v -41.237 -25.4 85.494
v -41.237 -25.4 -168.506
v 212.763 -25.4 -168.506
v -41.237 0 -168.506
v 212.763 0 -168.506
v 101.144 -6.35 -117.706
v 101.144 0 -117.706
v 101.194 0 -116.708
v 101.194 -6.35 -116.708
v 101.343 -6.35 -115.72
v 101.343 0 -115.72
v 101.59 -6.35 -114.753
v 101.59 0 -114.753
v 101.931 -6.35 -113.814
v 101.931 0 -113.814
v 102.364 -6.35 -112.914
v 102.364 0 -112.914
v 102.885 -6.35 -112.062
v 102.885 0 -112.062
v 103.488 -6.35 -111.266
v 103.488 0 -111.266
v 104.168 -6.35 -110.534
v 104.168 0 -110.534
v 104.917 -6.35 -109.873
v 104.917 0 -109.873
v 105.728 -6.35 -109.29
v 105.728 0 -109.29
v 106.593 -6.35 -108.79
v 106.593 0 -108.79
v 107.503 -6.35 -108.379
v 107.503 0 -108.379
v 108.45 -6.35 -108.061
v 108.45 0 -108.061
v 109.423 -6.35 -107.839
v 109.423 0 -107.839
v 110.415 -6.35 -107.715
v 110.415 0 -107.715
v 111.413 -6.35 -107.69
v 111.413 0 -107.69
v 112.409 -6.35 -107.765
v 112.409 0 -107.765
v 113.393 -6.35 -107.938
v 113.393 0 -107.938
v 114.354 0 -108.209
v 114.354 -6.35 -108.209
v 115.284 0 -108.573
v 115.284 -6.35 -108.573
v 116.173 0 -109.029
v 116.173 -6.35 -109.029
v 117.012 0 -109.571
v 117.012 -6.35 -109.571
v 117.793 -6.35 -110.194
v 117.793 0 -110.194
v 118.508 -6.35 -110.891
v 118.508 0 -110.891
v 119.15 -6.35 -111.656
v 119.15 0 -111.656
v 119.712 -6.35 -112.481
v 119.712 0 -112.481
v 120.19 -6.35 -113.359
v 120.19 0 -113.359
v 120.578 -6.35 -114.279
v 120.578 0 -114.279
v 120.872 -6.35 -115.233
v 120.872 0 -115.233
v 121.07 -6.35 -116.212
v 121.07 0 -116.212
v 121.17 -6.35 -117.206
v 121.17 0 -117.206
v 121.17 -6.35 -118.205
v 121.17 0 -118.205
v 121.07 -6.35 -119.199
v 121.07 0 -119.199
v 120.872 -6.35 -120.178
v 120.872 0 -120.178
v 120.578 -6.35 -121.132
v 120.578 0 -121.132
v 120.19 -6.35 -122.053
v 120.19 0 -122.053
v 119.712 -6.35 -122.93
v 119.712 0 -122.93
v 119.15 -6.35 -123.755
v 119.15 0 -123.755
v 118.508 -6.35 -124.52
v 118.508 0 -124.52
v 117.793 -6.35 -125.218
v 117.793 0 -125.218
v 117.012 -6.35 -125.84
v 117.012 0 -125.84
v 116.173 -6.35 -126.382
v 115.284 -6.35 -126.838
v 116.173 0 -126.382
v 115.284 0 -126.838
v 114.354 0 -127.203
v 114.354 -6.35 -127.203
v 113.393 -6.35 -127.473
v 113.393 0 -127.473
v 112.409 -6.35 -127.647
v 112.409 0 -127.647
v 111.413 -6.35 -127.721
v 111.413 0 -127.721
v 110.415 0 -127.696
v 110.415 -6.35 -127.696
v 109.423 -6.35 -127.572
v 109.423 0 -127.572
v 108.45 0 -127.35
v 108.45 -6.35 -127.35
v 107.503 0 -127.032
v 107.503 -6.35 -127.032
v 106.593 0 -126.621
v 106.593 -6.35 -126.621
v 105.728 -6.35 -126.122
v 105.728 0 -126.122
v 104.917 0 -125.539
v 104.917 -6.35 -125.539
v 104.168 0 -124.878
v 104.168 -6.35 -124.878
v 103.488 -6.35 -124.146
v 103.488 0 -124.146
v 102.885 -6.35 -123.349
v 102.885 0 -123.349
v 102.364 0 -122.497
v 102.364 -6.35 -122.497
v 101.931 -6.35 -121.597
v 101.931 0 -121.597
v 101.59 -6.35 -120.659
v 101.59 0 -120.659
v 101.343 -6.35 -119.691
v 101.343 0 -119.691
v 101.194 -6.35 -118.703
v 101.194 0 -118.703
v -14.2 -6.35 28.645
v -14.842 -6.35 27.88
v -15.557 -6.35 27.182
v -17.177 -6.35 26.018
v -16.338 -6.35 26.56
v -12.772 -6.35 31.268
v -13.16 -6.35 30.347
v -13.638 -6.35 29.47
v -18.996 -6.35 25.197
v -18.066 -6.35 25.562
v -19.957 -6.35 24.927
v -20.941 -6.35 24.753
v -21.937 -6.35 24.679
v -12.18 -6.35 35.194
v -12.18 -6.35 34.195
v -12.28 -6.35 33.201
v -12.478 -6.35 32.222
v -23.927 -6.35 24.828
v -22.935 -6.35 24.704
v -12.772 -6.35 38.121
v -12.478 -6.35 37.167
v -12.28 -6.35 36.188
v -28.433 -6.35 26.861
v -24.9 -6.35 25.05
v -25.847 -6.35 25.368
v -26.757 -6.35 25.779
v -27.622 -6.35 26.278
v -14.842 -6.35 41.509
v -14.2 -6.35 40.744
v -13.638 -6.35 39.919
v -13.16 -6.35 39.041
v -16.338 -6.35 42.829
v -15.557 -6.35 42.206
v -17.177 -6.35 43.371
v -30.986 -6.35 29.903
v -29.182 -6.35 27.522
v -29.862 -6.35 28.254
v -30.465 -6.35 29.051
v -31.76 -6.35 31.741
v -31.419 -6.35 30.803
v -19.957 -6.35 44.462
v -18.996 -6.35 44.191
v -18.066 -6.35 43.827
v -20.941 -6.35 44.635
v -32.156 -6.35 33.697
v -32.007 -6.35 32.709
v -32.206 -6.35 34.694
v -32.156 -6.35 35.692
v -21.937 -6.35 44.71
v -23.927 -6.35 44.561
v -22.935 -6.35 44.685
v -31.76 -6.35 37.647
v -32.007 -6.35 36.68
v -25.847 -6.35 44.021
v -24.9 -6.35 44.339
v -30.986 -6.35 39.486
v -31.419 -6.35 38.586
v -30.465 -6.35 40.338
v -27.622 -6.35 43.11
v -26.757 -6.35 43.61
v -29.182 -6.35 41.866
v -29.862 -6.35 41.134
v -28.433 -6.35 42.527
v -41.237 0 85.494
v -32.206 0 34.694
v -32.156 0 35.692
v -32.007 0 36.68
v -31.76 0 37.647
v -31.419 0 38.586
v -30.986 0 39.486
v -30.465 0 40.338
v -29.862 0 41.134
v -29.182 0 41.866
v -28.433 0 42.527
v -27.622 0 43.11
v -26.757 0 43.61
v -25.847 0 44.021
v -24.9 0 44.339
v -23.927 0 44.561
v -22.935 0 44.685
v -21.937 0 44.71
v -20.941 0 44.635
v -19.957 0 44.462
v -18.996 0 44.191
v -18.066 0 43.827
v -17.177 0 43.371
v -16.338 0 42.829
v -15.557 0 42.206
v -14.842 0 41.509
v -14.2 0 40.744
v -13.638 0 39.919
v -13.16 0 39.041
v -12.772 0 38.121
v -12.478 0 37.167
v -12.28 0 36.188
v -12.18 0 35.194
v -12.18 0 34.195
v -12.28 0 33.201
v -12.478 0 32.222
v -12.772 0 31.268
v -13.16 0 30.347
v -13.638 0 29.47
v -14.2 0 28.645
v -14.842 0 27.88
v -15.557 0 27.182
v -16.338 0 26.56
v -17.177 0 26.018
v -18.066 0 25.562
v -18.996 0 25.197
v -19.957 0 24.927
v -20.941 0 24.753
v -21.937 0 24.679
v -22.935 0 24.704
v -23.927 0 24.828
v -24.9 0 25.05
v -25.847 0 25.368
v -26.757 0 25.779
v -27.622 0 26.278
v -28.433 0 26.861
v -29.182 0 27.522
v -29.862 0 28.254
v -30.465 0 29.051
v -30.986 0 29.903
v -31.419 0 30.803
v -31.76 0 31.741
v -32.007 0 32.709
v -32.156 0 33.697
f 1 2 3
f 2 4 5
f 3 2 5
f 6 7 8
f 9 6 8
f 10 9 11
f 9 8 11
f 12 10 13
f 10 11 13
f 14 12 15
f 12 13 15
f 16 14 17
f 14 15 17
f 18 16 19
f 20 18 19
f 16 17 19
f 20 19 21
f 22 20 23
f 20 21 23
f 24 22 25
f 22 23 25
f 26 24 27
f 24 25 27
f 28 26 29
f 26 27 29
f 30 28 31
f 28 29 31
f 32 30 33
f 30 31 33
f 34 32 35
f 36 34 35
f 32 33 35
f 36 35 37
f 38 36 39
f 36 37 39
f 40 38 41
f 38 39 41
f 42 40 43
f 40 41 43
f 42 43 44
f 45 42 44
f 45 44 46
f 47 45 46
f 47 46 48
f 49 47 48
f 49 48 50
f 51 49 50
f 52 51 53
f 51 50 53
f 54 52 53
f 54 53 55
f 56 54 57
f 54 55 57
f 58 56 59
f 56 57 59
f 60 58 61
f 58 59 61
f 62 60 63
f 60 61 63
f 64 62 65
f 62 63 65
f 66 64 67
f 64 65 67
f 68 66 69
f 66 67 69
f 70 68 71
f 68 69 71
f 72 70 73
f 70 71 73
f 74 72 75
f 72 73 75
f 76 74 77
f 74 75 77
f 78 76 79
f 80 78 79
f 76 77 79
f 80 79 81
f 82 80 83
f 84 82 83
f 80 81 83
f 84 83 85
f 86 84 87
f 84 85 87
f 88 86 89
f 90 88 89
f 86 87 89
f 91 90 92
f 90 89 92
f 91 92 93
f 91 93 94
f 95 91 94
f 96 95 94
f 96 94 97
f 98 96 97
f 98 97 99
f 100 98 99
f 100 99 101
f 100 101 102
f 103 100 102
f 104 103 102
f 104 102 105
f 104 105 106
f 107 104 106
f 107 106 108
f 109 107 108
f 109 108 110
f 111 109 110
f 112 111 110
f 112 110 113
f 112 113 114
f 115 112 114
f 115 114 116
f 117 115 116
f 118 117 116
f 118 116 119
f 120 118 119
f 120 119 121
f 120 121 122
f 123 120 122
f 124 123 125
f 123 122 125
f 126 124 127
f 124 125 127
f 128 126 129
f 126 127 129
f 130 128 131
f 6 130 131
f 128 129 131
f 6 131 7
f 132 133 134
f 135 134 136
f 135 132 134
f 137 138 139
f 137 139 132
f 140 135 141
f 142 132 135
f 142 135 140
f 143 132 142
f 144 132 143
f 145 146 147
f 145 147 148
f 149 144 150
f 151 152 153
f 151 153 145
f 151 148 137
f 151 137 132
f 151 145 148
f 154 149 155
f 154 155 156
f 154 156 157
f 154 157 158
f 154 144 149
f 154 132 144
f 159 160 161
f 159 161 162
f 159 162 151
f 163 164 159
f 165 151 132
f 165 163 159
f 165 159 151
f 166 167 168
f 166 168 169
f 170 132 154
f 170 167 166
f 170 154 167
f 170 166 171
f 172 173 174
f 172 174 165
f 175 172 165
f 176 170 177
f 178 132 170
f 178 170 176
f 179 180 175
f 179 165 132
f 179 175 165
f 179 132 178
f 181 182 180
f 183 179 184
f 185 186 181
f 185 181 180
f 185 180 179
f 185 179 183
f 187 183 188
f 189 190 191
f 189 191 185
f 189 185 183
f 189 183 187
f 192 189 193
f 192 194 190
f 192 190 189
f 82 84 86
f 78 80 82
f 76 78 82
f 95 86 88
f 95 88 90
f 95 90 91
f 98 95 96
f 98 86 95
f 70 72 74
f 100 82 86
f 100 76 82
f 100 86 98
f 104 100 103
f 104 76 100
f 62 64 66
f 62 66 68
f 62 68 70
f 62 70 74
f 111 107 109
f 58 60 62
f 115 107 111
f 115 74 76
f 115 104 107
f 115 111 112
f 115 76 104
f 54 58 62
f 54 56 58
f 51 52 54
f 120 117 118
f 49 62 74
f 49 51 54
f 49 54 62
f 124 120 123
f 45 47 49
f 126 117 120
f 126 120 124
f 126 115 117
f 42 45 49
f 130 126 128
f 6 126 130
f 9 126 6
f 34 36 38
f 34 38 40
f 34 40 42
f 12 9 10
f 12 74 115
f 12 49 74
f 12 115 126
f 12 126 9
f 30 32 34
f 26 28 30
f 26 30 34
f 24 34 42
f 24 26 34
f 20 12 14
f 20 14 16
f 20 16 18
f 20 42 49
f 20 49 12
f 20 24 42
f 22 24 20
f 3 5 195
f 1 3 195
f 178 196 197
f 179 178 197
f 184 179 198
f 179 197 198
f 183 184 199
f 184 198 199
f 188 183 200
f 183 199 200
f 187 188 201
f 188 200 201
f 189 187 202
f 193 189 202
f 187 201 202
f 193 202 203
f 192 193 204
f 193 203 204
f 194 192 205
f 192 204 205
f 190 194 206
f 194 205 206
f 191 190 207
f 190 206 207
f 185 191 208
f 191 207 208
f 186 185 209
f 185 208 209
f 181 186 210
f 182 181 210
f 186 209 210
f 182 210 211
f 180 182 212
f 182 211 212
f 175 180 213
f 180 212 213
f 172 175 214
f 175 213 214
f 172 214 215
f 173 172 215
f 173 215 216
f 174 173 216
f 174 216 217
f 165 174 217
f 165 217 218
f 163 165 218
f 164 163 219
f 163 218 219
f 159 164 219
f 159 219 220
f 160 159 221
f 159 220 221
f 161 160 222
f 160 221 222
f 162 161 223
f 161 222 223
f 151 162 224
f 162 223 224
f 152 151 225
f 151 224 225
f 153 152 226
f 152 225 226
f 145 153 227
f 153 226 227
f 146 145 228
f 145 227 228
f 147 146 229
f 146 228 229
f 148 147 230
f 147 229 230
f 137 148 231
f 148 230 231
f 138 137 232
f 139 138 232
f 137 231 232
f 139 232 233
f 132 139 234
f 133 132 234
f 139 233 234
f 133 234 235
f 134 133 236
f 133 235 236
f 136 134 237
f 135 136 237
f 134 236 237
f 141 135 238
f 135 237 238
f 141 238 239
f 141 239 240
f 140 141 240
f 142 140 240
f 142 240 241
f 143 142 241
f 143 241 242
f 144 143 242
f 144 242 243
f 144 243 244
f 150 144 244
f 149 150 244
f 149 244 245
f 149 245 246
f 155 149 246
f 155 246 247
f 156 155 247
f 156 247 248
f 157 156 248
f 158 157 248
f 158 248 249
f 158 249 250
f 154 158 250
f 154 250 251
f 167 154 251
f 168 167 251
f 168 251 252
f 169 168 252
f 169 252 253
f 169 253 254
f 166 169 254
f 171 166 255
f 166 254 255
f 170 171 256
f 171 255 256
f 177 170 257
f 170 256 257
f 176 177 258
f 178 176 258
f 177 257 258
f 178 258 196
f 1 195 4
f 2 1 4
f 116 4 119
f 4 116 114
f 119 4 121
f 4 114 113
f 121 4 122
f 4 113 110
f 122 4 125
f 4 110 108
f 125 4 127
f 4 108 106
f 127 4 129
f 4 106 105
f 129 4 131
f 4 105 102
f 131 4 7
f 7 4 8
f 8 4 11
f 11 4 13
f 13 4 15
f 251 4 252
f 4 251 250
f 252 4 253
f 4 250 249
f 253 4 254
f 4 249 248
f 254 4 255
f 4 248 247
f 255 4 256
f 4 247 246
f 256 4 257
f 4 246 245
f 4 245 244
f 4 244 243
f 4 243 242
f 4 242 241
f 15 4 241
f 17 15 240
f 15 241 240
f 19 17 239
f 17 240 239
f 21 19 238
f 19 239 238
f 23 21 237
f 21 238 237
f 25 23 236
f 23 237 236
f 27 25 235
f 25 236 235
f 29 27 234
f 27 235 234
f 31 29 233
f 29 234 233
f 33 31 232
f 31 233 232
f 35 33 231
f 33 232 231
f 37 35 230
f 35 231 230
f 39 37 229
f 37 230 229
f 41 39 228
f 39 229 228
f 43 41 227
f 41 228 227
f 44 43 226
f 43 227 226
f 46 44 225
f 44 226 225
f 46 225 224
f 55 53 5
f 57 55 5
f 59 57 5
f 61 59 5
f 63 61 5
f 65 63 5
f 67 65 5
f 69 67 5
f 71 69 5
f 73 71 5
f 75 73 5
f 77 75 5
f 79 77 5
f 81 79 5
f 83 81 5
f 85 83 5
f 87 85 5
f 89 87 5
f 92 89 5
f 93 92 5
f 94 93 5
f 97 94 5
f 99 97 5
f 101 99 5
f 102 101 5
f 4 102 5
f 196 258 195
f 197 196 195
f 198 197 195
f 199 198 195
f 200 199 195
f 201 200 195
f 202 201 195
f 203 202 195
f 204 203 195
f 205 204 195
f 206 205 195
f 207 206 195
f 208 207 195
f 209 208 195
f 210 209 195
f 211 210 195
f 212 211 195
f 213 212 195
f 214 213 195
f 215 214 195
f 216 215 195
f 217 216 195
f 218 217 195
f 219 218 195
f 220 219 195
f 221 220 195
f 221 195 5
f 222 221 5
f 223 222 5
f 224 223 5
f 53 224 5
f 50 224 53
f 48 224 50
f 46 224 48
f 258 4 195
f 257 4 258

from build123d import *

# Parameters (mm, degrees)
F1_DEPTH = 25.4
F2_R     = 10.018842
F3_DEPTH = 6.35


with BuildPart() as f1:
    # F0 (on Front) → F1 (new body)
    with BuildSketch(Plane.XZ):
        Polygon((212.763246, -168.505661), (-41.236754, 85.494339), (-41.236754, -168.505661), align=None)
    extrude(amount=F1_DEPTH)

    # F2 (on face) → F3 (cut)
    with BuildSketch(Plane(origin=(0, 0, 0), x_dir=(-1, 0, 0), z_dir=(0, 1, 0))):
        with Locations((22.186754, 34.694339)):
            Circle(F2_R)
        with Locations((-111.163246, -117.705661)):
            Circle(F2_R)
    extrude(amount=-F3_DEPTH, mode=Mode.SUBTRACT)


solid = f1.part
